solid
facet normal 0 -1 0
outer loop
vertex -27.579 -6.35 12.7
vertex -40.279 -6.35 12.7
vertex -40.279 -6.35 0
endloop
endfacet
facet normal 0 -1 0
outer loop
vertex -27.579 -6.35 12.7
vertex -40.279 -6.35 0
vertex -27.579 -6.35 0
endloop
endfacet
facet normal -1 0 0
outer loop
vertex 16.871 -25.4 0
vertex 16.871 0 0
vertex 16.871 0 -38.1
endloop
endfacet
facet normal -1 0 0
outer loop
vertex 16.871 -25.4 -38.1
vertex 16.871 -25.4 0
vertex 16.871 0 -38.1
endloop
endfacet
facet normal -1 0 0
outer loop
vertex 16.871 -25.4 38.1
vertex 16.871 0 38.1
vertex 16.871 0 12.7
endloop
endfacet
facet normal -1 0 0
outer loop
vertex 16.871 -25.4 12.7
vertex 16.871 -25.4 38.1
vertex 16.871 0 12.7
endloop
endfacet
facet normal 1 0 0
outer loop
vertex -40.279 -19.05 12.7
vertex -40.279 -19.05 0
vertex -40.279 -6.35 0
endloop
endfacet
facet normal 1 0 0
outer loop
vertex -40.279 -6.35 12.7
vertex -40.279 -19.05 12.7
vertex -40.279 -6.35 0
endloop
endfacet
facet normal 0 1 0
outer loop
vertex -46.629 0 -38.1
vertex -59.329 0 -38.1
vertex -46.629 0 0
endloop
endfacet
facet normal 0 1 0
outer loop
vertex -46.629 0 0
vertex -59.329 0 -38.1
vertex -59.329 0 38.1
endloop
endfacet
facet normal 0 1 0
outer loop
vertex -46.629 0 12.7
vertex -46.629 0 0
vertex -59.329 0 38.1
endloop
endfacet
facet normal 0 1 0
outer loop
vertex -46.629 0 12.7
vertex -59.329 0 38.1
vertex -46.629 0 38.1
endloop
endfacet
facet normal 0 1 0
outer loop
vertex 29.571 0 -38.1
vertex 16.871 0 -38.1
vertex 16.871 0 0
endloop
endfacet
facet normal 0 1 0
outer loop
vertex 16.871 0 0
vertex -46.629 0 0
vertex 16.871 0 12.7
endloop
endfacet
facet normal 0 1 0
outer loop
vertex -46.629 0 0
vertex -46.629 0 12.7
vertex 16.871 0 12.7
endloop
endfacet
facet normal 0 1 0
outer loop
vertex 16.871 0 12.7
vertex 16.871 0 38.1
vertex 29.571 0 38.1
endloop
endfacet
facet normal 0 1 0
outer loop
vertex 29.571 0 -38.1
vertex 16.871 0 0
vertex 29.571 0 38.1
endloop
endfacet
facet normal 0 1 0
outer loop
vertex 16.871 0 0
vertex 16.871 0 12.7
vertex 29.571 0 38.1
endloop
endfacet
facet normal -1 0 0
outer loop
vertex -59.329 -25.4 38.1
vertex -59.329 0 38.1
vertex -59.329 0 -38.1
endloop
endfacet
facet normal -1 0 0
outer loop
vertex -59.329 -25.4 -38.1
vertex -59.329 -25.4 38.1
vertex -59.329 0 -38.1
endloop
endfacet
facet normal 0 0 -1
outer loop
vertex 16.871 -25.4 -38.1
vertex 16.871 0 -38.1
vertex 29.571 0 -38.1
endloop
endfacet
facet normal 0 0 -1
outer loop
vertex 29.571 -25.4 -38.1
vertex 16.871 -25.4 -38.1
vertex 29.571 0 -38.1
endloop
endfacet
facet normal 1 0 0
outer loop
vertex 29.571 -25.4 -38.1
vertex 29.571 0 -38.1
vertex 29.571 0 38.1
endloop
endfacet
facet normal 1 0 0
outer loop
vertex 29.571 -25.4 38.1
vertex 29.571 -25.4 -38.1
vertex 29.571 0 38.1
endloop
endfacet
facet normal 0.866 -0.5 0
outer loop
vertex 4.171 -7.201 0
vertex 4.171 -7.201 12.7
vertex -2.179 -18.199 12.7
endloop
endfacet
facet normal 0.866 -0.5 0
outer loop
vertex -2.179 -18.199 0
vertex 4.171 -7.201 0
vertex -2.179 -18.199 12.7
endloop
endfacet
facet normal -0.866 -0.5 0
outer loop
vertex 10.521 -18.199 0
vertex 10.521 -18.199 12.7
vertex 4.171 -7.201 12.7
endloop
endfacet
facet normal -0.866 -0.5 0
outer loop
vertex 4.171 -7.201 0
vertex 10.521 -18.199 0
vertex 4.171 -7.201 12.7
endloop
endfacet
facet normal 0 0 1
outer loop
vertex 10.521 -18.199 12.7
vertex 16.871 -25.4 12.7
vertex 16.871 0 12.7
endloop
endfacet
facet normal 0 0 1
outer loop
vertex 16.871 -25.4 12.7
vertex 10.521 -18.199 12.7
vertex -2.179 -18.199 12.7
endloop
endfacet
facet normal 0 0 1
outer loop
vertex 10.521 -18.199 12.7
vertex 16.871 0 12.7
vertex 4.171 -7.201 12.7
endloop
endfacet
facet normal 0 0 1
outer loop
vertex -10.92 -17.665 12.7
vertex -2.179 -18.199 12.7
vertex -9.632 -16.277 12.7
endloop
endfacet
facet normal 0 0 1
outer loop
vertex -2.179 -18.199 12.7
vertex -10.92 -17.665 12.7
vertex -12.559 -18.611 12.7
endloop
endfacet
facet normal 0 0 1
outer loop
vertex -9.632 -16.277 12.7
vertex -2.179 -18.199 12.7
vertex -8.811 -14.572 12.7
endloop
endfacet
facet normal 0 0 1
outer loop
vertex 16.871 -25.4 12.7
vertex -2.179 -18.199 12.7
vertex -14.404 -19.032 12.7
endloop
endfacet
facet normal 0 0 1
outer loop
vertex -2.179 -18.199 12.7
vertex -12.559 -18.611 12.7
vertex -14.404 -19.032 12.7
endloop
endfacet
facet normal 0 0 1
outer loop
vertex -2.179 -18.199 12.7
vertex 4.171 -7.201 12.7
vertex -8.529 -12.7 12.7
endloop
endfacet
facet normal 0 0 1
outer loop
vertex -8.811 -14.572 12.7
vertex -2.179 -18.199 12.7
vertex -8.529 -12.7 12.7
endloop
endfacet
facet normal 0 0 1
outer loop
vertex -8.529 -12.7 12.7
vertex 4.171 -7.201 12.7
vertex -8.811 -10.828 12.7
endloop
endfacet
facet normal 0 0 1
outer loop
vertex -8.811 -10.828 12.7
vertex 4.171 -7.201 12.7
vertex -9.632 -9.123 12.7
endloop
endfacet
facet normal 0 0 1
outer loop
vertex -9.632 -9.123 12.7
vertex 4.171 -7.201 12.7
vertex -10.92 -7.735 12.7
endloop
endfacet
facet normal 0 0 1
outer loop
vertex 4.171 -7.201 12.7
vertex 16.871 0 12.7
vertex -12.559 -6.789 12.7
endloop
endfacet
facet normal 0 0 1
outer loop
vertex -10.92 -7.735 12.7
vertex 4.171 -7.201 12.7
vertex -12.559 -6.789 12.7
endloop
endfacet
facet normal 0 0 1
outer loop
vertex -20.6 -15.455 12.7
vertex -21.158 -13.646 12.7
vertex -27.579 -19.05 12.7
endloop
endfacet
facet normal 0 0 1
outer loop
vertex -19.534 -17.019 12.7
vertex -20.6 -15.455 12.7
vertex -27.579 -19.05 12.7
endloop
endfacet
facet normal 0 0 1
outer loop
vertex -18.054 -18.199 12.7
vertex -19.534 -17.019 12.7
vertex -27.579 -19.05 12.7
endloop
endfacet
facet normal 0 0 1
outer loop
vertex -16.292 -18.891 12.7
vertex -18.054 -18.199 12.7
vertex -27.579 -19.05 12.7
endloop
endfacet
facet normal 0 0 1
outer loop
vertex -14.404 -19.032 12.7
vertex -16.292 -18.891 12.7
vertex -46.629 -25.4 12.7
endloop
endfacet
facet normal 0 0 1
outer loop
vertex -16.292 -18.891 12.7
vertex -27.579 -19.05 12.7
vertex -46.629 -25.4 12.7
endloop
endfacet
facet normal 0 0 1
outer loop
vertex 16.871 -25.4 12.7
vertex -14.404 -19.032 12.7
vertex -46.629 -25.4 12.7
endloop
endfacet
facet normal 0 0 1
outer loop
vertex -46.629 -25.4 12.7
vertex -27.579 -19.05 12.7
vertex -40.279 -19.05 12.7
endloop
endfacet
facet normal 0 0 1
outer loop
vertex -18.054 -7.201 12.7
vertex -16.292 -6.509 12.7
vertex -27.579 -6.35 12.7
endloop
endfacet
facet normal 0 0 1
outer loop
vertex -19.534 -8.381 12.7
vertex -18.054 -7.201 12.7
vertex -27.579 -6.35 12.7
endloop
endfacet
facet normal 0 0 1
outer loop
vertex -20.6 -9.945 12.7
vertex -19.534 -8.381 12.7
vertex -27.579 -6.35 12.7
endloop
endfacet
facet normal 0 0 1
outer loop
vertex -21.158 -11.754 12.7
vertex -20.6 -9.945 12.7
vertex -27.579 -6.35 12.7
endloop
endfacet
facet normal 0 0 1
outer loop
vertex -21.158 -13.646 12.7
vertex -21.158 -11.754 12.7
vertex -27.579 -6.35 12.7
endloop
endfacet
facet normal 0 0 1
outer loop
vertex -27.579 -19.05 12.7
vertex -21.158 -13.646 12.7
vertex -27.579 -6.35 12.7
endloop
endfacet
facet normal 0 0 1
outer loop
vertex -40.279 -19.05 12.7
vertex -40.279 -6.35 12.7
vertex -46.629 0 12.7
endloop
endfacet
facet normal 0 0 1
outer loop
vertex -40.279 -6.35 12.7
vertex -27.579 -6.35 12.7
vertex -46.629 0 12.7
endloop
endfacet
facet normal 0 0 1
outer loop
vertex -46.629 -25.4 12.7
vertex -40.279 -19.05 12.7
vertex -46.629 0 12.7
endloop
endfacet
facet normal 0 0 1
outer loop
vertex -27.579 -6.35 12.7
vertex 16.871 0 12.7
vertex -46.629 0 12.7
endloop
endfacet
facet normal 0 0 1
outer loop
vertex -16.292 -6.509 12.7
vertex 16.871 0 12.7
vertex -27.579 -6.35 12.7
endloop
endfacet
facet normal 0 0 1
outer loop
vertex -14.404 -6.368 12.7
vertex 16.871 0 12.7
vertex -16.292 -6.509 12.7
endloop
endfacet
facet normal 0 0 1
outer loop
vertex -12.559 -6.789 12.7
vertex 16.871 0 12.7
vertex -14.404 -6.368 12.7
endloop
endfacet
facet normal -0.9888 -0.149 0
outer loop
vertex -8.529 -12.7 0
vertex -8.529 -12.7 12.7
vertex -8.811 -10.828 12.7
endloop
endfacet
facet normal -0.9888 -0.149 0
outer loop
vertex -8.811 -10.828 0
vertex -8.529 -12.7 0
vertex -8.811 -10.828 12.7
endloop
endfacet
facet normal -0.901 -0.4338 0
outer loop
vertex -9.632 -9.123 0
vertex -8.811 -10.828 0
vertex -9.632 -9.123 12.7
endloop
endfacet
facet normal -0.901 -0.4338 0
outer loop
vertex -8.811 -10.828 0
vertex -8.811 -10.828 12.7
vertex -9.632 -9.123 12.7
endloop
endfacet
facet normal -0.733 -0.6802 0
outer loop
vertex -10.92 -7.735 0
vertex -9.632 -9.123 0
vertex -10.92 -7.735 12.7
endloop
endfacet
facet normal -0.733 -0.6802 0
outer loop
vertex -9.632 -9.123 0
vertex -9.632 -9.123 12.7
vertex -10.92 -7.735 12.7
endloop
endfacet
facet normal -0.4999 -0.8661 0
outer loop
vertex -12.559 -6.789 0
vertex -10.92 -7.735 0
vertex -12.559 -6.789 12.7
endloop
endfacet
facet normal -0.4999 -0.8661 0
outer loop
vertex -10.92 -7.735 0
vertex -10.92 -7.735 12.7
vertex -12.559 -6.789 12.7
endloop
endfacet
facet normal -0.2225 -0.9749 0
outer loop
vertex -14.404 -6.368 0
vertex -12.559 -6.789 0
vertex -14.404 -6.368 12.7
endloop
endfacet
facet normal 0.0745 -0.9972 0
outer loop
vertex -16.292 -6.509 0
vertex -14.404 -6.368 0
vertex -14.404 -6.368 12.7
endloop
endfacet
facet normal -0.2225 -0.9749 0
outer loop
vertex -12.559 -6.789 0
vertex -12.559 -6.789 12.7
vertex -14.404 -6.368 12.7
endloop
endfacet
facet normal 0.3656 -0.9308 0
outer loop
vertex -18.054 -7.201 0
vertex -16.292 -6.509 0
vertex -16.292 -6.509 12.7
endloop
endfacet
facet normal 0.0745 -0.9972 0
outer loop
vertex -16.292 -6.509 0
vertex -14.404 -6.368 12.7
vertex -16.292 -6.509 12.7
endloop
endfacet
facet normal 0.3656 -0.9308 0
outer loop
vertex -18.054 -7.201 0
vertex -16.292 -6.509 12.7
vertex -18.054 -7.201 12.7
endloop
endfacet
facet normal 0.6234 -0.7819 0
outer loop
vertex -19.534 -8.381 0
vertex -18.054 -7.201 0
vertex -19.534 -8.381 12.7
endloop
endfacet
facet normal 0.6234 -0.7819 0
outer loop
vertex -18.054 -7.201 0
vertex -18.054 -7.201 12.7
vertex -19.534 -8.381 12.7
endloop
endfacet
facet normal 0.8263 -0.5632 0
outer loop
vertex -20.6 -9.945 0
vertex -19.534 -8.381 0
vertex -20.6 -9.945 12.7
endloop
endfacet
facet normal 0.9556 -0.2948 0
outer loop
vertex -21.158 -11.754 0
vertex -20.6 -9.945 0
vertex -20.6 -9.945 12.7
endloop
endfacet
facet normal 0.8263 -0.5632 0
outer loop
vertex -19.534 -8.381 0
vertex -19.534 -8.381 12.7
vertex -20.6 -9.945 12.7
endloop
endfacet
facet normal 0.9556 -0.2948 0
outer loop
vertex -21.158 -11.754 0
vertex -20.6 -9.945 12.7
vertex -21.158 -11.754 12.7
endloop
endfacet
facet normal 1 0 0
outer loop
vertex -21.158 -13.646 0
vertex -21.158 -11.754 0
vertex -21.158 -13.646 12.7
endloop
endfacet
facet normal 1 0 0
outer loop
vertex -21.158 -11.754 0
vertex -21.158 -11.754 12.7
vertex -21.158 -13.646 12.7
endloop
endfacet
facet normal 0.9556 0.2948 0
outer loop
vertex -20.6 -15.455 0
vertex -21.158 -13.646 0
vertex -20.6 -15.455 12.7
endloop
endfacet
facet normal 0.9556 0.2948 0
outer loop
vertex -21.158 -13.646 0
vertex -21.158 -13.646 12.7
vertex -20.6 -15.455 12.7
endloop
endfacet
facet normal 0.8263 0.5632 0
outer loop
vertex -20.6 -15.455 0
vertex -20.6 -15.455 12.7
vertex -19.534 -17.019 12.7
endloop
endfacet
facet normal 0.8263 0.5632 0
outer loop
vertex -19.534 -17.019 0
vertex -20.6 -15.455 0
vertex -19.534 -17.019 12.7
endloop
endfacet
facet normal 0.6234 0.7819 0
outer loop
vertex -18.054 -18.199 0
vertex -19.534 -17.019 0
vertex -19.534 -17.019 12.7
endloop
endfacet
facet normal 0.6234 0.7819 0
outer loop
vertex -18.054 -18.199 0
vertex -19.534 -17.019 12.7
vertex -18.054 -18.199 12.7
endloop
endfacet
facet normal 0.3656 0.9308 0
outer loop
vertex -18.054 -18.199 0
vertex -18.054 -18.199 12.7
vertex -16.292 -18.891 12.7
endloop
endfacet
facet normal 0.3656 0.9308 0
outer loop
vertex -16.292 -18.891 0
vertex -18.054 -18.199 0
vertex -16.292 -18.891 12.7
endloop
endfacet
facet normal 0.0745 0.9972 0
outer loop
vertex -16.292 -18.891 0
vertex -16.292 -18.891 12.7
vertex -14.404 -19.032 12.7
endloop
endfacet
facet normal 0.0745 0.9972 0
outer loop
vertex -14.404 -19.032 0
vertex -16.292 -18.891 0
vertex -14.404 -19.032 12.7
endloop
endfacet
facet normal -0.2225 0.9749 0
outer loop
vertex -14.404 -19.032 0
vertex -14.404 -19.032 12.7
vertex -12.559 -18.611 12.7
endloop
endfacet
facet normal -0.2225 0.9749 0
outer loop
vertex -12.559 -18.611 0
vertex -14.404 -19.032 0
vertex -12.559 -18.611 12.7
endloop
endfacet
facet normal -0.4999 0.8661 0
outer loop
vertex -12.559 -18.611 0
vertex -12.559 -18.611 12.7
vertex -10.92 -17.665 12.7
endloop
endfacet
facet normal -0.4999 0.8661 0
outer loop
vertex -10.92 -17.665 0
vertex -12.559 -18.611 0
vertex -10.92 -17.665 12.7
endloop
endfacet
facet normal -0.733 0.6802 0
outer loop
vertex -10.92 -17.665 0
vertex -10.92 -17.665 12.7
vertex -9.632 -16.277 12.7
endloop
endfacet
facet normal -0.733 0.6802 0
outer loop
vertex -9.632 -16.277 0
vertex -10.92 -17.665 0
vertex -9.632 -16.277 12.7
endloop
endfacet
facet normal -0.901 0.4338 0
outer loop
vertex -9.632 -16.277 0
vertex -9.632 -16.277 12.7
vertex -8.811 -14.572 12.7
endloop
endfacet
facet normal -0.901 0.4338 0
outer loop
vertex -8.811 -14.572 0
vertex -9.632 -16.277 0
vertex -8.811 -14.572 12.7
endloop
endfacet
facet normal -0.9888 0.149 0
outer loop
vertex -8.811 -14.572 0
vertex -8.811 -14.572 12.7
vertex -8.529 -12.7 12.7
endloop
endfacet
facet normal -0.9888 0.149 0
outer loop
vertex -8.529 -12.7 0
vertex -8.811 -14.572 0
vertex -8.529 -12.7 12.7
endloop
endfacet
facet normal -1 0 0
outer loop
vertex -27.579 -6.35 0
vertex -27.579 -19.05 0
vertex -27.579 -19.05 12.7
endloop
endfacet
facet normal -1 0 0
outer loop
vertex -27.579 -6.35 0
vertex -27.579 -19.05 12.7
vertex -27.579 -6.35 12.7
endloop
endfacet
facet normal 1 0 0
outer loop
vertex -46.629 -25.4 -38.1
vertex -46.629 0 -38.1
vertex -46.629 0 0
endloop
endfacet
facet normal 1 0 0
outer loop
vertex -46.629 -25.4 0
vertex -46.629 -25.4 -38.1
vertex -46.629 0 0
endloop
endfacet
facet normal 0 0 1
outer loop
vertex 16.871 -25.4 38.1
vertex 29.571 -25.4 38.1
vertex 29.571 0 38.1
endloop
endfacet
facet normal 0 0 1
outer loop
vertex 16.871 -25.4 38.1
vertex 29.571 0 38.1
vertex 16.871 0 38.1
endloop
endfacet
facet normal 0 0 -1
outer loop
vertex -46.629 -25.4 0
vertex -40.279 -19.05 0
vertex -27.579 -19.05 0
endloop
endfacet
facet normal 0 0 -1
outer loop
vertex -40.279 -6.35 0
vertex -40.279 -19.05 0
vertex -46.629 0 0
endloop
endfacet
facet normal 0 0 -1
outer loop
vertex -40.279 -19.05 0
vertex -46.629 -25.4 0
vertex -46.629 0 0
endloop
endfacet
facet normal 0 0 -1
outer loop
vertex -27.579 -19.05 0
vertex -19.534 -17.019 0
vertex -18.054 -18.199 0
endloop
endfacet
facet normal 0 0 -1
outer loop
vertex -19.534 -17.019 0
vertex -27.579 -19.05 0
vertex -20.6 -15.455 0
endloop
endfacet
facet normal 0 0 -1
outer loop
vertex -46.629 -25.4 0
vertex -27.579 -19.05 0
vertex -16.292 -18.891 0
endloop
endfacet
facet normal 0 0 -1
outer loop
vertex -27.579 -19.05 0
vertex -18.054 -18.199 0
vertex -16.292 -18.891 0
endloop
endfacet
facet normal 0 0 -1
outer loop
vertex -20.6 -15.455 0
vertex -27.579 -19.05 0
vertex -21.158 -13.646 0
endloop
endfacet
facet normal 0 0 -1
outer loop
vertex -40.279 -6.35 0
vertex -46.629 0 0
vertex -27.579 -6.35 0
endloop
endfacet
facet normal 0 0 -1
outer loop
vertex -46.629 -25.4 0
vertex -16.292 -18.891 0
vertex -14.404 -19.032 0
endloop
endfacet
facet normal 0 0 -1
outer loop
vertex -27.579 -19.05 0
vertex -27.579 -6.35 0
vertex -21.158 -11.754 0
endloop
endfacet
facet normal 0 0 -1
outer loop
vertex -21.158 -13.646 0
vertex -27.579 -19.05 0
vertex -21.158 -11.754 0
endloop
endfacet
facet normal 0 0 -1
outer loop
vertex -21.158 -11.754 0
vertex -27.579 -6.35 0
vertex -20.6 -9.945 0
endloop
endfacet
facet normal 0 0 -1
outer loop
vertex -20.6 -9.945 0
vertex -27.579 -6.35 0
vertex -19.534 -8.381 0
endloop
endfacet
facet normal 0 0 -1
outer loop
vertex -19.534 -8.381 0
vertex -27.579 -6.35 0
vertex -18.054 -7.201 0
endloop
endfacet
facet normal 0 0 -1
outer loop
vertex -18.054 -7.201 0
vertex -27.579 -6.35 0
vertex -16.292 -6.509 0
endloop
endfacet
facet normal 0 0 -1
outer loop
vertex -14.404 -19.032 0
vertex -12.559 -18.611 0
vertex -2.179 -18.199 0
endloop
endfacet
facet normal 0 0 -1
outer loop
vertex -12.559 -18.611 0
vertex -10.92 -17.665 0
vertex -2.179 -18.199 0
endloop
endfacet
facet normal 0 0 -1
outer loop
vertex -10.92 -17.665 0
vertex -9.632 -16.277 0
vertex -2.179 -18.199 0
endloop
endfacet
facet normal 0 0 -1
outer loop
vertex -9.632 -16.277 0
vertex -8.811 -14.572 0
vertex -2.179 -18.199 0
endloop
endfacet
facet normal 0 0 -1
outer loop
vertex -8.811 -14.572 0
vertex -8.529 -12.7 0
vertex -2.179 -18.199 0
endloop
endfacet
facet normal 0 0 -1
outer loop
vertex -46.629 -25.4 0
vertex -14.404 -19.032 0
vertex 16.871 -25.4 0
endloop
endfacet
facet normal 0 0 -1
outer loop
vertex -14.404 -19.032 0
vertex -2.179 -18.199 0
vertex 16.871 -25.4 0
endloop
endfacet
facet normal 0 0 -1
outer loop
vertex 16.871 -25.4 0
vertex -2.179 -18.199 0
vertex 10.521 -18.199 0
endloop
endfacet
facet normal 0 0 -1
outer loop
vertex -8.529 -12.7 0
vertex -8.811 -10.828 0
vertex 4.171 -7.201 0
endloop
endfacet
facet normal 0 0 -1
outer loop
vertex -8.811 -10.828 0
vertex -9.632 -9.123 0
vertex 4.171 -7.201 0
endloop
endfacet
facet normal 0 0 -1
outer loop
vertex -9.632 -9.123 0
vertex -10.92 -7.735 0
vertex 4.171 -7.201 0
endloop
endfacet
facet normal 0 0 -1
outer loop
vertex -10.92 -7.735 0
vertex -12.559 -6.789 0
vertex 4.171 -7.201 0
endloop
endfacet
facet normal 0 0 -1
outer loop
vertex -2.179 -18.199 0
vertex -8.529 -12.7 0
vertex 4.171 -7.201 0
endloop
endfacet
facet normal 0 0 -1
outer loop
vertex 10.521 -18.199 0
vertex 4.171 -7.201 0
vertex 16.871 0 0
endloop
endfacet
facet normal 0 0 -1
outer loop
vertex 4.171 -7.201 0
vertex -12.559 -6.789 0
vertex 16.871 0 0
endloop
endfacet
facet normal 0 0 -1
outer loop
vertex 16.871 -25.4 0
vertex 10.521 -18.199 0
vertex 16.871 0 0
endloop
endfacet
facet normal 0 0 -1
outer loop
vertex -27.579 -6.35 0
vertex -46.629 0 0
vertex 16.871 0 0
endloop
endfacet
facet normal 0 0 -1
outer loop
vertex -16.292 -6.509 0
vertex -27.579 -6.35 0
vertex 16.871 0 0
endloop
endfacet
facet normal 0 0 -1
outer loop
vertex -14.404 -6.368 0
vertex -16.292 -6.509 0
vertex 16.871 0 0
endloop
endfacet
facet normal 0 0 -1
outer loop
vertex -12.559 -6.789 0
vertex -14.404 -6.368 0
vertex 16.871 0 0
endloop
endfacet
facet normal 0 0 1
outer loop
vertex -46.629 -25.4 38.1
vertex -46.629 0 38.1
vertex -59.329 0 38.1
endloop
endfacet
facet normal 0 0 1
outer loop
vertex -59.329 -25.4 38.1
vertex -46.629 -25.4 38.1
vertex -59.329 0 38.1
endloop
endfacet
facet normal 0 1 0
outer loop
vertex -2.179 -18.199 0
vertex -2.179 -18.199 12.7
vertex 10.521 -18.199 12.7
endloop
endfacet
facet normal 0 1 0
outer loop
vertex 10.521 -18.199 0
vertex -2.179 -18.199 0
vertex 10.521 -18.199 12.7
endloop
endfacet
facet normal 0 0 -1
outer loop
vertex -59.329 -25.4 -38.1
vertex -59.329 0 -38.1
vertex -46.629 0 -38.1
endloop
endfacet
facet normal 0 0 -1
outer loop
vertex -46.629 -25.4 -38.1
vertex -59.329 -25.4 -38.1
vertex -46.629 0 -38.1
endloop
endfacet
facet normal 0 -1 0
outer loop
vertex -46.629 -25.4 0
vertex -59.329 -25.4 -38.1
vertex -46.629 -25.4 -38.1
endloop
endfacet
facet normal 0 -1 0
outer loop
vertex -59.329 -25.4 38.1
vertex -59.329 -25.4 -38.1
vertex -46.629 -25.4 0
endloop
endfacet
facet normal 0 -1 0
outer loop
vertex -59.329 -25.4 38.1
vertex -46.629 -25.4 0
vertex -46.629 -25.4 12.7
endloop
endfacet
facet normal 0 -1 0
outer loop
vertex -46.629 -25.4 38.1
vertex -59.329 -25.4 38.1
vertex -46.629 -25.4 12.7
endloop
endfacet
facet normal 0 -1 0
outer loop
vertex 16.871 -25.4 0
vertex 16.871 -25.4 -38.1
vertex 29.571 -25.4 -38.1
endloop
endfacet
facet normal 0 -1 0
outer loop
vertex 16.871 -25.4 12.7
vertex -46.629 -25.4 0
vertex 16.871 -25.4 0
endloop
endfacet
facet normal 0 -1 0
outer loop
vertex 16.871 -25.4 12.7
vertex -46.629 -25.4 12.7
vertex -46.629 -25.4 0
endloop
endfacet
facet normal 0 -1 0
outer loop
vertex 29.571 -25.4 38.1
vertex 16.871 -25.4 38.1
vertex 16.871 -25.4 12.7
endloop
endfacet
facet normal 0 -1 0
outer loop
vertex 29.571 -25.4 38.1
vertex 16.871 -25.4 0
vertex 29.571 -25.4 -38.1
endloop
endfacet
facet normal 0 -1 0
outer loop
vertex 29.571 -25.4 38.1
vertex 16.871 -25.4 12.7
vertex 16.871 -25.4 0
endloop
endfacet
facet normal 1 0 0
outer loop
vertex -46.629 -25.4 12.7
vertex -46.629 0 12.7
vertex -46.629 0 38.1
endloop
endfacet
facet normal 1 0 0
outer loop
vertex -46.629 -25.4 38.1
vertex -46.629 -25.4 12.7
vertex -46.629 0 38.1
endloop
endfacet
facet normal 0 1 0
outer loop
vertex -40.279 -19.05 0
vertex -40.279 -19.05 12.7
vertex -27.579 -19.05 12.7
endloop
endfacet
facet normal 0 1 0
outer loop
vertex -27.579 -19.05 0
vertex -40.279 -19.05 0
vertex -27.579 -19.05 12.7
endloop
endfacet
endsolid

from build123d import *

# Parameters (mm, degrees)
F1_DEPTH = 25.4
F2_W     = 12.7
F2_H     = 12.7
F3_DEPTH = 25.4
F4_R     = 6.35
F5_DEPTH = 25.4
F7_DEPTH = 25.4


with BuildPart() as f1:
    # F0 (on Front) → F1 (new body)
    with BuildSketch(Plane.XZ):
        Polygon((-46.628909, 38.1), (-59.328909, 38.1), (-59.328909, -38.1), (-46.628909, -38.1), (-46.628909, 0), (16.871091, 0), (16.871091, -38.1), (29.571091, -38.1), (29.571091, 38.1), (16.871091, 38.1), (16.871091, 12.7), (-46.628909, 12.7), align=None)
    extrude(amount=F1_DEPTH)

    # F2 (on face) → F3 (cut)
    with BuildSketch(Plane.XY.offset(12.7)):
        with Locations((-33.928909, -12.7)):
            Rectangle(F2_W, F2_H)
    extrude(amount=-F3_DEPTH, mode=Mode.SUBTRACT)

    # F4 (on face) → F5 (cut)
    with BuildSketch(Plane.XY.offset(12.7)):
        with Locations((-14.878909, -12.7)):
            Circle(F4_R)
    extrude(amount=-F5_DEPTH, mode=Mode.SUBTRACT)

    # F6 (on face) → F7 (cut)
    with BuildSketch(Plane.XY.offset(12.7)):
        Polygon((4.171091, -7.2009), (-2.178909, -18.199423), (10.521091, -18.199423), align=None)
    extrude(amount=-F7_DEPTH, mode=Mode.SUBTRACT)


solid = f1.part
